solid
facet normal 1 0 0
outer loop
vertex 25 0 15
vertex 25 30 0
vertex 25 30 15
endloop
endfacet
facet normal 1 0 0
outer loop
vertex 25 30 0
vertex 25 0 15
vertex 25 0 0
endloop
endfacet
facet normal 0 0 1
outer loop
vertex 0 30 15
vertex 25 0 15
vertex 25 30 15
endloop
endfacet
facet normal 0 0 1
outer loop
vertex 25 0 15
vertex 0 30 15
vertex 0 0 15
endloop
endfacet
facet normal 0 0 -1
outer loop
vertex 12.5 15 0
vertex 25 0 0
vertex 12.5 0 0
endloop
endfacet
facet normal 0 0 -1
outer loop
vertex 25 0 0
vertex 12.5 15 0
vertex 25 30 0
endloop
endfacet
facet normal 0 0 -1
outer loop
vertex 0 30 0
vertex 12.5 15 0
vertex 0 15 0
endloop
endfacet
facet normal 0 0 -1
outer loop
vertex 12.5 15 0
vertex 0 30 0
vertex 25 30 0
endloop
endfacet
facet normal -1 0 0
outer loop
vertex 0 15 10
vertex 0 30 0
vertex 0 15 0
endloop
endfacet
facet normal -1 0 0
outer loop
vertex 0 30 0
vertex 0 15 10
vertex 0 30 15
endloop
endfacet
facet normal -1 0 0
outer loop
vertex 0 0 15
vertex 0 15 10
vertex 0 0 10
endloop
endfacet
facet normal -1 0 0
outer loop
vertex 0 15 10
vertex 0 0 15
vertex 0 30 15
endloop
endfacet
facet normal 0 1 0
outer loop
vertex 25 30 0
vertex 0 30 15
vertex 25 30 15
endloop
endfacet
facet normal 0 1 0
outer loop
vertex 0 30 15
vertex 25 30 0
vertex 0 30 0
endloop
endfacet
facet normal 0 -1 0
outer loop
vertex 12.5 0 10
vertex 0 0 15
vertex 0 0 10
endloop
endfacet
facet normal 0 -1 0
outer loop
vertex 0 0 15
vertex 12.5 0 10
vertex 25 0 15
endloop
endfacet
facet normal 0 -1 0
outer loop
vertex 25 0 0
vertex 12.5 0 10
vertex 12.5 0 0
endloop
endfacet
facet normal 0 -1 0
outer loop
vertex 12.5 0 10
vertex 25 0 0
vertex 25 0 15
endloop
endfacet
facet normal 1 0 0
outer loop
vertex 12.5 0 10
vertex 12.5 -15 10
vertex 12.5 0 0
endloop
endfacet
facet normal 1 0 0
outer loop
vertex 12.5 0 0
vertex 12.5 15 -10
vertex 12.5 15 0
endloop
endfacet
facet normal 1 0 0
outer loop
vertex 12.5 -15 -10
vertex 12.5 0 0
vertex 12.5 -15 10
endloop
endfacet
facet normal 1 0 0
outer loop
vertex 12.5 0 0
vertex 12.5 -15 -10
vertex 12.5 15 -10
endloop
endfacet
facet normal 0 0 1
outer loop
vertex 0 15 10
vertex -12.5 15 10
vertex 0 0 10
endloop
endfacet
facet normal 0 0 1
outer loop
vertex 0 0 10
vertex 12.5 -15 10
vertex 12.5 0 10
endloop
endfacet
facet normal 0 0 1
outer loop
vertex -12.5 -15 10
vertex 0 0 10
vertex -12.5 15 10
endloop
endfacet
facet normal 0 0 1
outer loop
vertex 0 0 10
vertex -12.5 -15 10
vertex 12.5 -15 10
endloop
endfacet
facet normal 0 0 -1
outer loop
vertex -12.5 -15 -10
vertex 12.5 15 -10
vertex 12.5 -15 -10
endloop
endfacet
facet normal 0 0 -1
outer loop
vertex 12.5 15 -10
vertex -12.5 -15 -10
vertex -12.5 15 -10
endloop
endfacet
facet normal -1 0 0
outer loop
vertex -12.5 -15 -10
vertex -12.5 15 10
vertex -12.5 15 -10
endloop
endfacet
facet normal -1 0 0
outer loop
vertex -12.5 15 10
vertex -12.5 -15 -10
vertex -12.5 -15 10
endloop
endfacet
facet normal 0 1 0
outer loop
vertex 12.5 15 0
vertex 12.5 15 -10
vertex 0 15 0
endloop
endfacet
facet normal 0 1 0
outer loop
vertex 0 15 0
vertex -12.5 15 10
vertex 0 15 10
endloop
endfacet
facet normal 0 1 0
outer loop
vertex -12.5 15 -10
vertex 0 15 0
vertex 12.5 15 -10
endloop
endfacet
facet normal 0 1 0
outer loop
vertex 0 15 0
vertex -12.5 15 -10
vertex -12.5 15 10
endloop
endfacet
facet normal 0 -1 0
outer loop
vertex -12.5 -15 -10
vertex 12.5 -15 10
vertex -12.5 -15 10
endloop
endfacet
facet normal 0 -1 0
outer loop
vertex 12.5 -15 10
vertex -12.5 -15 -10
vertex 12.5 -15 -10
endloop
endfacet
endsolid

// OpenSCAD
// Generated by generate_scads.py
union() {
  union() {
    sphere(r=6);
    cylinder(h=5, r=6, center=true);
    cube(size=[25,30,15], center=false);
  }
  cube(size=[25,30,20], center=true);
}
